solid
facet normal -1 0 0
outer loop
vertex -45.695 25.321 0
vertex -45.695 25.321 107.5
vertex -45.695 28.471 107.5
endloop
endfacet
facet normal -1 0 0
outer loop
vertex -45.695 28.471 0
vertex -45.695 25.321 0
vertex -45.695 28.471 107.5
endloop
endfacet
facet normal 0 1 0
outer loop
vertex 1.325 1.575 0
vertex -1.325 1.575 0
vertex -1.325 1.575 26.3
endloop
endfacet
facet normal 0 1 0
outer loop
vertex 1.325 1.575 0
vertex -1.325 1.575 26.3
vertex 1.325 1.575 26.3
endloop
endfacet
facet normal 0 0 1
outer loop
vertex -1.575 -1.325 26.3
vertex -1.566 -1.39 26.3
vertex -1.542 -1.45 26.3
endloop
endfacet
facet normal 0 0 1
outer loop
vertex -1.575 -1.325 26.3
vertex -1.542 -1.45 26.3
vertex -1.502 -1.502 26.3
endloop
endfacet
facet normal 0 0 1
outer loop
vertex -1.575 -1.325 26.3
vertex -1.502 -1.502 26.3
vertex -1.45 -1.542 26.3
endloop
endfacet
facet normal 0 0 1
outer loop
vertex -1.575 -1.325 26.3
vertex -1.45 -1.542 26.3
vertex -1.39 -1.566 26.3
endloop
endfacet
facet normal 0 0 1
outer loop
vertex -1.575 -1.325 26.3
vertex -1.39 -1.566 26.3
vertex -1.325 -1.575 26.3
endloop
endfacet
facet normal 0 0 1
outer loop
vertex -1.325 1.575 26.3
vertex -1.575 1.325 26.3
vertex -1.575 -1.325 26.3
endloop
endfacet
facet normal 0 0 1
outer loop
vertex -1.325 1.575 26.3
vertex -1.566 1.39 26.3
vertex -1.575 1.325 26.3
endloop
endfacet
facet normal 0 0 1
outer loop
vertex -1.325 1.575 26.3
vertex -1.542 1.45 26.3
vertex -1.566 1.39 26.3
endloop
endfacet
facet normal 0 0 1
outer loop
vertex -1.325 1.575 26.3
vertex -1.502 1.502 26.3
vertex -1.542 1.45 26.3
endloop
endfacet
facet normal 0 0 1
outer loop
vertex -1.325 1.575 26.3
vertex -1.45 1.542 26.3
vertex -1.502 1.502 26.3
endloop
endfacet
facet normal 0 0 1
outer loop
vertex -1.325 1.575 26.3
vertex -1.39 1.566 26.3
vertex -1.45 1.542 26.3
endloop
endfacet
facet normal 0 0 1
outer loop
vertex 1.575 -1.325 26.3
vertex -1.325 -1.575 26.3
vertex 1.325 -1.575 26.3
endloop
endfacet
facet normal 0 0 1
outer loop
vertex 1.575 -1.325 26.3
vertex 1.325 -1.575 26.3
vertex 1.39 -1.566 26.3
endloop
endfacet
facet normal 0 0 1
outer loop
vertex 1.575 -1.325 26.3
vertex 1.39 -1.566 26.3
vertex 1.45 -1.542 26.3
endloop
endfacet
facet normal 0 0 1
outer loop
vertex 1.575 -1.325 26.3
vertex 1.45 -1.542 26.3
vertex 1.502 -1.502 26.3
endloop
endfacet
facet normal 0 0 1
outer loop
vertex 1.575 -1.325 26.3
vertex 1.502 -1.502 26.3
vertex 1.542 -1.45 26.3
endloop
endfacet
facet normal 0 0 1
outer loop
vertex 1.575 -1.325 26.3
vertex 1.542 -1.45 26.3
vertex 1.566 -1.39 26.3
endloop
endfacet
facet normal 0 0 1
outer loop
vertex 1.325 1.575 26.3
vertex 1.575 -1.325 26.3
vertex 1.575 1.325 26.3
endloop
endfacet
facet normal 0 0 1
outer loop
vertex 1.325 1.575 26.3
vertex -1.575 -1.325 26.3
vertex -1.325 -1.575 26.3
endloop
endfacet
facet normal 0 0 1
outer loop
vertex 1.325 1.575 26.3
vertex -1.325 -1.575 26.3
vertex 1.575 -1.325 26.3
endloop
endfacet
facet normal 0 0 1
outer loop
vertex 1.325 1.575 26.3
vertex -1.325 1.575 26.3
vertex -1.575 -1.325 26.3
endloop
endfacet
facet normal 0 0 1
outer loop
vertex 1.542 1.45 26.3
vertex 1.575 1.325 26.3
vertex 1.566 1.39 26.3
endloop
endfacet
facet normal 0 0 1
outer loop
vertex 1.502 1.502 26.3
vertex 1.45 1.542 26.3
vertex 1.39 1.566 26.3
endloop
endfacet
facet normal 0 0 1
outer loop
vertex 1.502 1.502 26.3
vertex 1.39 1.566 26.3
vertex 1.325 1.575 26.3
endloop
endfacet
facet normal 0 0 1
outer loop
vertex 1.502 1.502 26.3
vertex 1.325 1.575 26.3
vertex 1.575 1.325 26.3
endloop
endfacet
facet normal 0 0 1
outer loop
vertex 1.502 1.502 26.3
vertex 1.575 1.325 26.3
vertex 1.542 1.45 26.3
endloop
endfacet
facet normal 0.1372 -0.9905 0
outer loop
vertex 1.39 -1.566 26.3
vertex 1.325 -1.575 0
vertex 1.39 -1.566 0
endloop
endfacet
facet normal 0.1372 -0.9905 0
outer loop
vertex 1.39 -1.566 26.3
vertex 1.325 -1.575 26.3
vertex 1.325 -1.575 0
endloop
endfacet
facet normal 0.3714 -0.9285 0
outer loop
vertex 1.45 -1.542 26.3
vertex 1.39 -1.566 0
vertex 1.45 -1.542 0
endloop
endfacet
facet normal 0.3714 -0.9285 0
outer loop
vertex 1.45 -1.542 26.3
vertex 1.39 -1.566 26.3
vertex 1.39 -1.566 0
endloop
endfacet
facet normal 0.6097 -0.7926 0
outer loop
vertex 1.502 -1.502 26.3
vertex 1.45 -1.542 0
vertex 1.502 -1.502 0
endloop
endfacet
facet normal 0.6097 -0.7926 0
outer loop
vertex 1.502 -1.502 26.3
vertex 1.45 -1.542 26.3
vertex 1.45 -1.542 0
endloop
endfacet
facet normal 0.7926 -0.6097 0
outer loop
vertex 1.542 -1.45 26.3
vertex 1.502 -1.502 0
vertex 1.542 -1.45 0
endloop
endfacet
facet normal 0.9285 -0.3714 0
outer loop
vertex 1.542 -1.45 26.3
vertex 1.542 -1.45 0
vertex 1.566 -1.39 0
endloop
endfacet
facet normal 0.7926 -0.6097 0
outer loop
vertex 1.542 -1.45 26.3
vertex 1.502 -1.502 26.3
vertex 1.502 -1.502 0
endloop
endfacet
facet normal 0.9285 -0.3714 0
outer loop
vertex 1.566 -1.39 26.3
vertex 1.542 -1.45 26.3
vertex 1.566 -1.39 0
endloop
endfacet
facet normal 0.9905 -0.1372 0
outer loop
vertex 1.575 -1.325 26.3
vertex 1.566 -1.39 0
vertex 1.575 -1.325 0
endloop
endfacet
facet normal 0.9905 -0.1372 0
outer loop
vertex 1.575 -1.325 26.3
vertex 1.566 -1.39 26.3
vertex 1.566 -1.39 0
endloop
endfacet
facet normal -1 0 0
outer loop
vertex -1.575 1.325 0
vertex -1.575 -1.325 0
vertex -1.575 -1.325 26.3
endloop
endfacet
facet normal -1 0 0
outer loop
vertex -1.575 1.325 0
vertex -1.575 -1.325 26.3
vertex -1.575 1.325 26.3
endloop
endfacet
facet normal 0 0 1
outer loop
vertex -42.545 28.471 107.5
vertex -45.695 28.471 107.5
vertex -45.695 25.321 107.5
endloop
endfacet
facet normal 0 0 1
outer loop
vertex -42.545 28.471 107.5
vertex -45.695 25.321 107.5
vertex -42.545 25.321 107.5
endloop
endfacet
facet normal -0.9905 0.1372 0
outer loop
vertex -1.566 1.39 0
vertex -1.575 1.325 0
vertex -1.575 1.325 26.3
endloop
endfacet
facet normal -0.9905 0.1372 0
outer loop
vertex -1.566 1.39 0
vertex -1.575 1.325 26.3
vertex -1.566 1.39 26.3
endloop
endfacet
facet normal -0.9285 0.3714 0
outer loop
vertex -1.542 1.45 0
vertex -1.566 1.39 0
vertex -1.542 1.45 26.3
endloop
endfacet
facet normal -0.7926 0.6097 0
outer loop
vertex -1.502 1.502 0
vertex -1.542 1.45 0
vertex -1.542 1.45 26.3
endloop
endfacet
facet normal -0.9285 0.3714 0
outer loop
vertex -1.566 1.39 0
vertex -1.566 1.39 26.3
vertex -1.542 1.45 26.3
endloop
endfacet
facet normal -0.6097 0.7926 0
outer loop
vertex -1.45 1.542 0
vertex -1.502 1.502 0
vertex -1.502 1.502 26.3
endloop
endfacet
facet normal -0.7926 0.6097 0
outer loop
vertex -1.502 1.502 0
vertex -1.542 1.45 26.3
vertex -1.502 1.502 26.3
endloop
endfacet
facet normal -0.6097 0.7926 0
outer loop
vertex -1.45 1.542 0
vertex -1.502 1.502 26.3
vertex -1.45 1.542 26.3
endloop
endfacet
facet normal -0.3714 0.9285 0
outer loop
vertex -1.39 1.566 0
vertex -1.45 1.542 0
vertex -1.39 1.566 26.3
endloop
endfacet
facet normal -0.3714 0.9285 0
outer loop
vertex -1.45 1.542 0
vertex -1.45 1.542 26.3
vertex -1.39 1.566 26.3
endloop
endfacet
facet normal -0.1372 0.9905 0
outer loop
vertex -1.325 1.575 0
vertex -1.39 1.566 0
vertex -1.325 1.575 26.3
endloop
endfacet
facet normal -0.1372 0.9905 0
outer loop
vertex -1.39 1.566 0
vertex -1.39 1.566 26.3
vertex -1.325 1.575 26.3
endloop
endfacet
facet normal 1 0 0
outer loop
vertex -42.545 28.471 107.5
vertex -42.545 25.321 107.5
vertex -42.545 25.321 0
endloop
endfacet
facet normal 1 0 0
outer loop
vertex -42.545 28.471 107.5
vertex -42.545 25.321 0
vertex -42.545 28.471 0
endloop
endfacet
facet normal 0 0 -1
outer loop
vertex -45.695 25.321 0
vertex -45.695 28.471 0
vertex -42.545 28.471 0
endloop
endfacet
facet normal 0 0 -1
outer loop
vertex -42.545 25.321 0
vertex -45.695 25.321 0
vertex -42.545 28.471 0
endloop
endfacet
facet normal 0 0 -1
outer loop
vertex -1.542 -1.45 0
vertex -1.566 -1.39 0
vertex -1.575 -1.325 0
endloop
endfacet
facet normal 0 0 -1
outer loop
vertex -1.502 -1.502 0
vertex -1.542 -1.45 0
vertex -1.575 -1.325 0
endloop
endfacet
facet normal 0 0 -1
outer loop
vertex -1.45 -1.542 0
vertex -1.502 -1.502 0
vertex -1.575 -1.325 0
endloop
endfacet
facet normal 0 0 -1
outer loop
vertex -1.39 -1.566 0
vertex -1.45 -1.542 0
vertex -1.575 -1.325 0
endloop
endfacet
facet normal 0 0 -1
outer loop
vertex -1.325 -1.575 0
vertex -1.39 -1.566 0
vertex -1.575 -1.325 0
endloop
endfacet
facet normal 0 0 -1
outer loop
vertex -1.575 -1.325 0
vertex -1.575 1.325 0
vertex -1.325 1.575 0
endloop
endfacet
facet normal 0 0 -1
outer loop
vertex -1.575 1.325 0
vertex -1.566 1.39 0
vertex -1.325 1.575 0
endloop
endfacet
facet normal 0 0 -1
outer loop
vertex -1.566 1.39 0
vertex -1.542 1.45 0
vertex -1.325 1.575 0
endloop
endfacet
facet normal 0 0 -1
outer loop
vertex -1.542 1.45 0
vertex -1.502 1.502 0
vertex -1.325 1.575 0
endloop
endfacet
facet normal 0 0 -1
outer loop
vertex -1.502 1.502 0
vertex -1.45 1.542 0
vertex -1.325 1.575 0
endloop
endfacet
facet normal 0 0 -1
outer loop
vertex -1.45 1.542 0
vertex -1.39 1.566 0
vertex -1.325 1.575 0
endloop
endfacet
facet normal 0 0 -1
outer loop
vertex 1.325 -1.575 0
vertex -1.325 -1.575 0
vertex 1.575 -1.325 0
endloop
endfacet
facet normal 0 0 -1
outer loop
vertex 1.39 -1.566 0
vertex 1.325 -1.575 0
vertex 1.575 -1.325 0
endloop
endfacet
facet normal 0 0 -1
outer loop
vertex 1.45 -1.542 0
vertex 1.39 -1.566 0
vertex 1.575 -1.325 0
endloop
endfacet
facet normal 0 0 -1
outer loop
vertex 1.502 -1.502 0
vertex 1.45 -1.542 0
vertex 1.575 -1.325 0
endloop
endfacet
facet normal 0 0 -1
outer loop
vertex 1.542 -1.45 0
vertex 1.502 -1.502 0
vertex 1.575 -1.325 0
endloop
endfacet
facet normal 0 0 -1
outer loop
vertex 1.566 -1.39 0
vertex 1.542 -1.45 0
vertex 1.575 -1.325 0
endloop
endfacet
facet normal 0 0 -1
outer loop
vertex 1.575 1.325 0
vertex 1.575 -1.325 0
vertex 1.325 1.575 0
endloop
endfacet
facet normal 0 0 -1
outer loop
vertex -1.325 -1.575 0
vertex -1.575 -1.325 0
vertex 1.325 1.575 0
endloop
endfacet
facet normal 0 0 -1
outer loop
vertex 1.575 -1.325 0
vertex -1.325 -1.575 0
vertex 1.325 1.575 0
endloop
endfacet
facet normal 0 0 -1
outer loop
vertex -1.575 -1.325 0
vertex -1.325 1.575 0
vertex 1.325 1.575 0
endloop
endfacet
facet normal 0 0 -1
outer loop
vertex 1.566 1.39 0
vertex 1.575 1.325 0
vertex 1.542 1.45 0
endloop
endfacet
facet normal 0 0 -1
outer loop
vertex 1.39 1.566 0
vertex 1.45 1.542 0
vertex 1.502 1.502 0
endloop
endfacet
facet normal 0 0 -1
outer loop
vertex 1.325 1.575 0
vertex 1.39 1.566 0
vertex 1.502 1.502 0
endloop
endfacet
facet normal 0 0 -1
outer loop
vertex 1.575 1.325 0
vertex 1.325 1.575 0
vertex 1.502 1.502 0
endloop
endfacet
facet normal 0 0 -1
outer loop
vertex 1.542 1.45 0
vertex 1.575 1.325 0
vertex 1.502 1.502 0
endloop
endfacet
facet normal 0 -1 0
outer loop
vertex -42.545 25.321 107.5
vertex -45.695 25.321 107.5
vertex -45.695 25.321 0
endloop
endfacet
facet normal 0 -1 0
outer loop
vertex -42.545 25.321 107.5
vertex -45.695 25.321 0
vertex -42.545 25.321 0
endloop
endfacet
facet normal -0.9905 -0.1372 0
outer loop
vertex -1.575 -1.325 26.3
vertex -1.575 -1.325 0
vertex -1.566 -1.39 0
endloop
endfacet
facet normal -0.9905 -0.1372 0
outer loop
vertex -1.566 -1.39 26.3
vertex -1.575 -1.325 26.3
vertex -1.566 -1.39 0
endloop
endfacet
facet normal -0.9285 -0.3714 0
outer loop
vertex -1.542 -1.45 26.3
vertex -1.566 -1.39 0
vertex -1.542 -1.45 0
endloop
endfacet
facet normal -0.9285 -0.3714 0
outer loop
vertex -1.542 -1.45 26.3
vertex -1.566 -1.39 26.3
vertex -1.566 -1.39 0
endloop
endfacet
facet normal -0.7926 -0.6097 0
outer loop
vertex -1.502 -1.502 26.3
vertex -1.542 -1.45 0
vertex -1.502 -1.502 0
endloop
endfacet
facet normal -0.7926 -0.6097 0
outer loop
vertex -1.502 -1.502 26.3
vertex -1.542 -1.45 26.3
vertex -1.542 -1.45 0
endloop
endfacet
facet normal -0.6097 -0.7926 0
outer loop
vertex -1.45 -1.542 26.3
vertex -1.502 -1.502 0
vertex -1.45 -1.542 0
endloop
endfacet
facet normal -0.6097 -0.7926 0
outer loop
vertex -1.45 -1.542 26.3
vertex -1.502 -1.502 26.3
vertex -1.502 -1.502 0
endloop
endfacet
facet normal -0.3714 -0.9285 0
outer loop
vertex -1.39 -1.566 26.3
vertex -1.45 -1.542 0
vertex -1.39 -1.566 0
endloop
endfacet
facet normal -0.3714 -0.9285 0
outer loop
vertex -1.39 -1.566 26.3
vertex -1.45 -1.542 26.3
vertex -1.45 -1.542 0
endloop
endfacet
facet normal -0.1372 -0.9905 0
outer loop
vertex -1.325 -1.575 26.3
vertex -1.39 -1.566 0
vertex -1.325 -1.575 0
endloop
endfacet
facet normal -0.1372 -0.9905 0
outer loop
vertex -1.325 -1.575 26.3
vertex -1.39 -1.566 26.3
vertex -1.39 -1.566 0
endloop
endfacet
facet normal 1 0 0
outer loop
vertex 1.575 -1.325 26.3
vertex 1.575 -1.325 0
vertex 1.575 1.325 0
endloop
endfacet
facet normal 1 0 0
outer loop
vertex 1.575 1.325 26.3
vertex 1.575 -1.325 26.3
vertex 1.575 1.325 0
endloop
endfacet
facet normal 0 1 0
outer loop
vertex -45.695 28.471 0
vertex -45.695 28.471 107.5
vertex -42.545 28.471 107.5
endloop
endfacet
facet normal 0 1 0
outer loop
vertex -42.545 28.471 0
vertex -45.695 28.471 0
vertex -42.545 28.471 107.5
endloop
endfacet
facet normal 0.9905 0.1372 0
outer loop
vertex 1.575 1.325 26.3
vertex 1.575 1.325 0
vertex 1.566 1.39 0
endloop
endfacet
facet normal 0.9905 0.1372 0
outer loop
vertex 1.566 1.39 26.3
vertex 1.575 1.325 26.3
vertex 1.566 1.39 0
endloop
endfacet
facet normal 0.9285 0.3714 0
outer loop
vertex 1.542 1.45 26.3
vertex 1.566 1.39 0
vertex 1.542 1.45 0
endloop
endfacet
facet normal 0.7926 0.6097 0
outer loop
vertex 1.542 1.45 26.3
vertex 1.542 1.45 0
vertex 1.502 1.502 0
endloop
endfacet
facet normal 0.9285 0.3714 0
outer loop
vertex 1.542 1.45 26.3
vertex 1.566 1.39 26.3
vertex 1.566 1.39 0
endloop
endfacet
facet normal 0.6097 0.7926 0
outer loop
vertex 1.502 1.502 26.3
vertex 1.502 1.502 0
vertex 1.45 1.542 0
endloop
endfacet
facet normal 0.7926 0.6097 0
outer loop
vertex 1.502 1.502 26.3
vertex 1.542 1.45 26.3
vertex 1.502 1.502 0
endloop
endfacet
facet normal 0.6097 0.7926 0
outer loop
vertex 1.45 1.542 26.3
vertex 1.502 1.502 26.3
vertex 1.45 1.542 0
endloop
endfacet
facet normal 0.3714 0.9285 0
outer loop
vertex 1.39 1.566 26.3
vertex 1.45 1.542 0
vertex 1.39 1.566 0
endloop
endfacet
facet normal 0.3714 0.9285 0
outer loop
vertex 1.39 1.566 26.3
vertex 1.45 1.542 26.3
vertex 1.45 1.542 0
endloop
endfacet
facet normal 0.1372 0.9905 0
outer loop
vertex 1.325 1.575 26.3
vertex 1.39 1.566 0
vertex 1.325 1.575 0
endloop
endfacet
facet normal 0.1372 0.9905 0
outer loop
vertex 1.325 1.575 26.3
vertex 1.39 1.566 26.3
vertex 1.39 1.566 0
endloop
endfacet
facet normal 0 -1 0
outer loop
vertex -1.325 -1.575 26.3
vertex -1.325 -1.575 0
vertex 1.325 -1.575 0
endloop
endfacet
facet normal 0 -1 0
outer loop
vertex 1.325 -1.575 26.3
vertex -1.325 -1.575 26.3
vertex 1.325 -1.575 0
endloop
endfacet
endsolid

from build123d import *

# Parameters (mm, degrees)
F0_W     = 3.15
F0_H     = 3.15
F1_DEPTH = 26.3
F2_R     = 0.25
F3_DEPTH = 107.5


with BuildPart() as f1:
    # F0 (on Top) → F1 (new body)
    with BuildSketch(Plane.XY):
        Rectangle(F0_W, F0_H)
    extrude(amount=F1_DEPTH)

    # F2
    f2_edges = [f1.edges().sort_by_distance(p)[0] for p in [
        (-1.575, -1.575, 13.15),
        (1.575, -1.575, 13.15),
        (1.575, 1.575, 13.15),
        (-1.575, 1.575, 13.15),
    ]]
    fillet(f2_edges, radius=F2_R)


with BuildPart() as f3:
    # F0 (on Top) → F3 (new body)
    with BuildSketch(Plane.XY):
        with Locations((-44.120011, 26.895686)):
            Rectangle(F0_W, F0_H)
    extrude(amount=F3_DEPTH)


solid = Compound([f1.part, f3.part])
